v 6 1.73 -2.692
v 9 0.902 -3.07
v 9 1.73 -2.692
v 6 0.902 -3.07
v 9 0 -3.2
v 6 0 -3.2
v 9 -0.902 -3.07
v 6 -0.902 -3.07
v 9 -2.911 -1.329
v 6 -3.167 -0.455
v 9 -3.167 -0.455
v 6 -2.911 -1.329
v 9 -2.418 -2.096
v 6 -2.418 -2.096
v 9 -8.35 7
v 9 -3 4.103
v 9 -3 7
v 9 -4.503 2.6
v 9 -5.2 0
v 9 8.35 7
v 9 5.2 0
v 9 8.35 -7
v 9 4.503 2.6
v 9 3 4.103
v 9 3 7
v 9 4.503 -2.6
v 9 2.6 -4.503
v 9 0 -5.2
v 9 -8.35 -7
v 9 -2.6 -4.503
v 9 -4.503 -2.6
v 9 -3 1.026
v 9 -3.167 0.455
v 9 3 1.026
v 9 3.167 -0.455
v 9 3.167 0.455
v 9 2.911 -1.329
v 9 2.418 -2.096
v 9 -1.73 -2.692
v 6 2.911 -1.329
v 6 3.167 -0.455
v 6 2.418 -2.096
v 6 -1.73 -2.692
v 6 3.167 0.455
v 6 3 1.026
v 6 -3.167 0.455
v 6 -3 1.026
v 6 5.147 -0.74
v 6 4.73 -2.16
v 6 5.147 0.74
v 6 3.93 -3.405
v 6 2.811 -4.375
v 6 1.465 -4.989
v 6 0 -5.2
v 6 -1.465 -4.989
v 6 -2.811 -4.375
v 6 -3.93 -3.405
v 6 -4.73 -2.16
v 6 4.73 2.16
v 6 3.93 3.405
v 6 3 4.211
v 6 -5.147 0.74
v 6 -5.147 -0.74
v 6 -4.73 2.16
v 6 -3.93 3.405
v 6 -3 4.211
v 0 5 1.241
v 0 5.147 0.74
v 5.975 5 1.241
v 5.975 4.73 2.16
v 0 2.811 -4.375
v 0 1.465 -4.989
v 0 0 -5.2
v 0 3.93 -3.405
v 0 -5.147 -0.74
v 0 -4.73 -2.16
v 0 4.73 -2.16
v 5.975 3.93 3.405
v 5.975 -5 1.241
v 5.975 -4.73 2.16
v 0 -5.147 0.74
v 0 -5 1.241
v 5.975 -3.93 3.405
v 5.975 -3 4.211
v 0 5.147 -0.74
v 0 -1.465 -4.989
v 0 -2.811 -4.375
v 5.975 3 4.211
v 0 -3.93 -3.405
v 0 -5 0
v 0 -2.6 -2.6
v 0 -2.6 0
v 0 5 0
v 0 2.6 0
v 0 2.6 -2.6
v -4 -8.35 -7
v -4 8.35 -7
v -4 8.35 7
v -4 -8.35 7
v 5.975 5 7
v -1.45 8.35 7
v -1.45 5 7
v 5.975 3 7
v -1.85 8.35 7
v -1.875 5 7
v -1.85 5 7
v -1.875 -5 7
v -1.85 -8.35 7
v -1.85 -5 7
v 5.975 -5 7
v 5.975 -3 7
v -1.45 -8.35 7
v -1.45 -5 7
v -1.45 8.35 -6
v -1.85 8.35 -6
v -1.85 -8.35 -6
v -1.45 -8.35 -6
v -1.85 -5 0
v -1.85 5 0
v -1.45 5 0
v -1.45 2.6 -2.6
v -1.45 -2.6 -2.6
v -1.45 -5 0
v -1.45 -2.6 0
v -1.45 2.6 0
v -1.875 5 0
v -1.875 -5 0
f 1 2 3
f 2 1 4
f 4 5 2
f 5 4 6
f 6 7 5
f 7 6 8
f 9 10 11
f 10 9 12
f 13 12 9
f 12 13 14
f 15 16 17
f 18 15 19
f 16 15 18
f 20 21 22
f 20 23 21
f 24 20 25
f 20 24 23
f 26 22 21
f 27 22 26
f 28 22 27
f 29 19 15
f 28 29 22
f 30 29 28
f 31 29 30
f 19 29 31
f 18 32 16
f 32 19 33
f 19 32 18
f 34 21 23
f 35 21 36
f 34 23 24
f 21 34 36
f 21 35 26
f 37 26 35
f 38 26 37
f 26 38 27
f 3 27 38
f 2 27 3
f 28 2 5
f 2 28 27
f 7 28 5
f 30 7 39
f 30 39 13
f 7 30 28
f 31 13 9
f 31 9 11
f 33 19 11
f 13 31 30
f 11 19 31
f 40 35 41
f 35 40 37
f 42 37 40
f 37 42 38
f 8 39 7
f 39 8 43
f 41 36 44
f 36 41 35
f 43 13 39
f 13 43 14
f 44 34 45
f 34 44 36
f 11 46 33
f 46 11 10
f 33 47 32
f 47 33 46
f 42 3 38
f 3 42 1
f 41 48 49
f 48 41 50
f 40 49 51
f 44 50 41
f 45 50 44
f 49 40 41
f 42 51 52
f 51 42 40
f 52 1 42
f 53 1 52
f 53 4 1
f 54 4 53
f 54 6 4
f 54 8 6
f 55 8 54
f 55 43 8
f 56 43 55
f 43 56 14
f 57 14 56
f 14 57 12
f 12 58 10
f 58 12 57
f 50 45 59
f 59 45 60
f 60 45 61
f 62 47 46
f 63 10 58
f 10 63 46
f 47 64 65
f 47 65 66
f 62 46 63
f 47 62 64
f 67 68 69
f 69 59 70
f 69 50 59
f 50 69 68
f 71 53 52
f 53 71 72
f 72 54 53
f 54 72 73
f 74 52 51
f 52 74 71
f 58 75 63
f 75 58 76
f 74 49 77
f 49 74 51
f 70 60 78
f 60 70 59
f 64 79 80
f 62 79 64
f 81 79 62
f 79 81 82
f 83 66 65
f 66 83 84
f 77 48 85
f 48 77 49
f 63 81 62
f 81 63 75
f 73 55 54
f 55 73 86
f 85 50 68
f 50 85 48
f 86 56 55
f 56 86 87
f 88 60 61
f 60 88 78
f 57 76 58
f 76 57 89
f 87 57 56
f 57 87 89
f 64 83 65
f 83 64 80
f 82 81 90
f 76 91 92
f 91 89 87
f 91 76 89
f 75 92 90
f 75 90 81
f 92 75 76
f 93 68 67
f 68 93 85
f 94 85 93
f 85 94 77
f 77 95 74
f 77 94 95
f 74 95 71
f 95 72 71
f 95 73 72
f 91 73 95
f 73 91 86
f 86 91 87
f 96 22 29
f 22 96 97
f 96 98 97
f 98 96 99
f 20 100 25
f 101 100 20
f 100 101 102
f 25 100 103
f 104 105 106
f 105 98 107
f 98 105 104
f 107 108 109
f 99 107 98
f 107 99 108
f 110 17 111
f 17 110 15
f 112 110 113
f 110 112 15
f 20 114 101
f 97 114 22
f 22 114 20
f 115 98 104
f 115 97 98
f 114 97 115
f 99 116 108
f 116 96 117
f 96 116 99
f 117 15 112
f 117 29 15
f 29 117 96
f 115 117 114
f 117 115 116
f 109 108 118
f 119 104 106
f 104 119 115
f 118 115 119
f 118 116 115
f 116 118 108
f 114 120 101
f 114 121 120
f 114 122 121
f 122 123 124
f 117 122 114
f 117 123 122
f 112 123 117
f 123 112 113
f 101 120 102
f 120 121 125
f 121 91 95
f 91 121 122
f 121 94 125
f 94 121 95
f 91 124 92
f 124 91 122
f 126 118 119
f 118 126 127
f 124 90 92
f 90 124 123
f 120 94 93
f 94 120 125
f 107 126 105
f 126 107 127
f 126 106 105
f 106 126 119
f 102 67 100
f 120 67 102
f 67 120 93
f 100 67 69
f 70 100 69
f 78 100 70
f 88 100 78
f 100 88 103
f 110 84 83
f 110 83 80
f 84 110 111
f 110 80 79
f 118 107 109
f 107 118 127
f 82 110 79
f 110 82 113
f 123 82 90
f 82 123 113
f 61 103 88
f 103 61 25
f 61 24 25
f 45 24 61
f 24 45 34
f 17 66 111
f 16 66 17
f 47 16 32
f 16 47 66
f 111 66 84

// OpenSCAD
// Lights1a
// headblock for leds, fibers insert with ferrules Lights1b part

tol=0.20;

difference(){
// Rx body
translate([-4,-8.35,-7]) color("cyan")
linear_extrude(height=14) square(size=[13,16.7]);


rotate([0,90,0])
//difference(){
union(){
//------------
// First jacket
translate([0,0,16]) color("green")
cylinder(r1=4+tol,r2=2+tol,h=20,$fn=22);

//------------
// Narrow part
translate([0,0,6]) color("pink")
cylinder(r1=3+tol,r2=3+tol,h=3,$fn=22);

//------------
// wide part
translate([0,0,9]) color("red")
cylinder(r1=5+tol,r2=5+tol,h=3,$fn=12);
translate([0,0,12]) color("red")
cylinder(r1=4+tol,r2=4+tol,h=2,$fn=12);
translate([0,0,14]) color("red")
cylinder(r1=5+tol,r2=5+tol,h=3,$fn=12);

//-------------
//  head
translate([0,0,0]) color("orange")
cylinder(r1=5+tol,r2=5+tol,h=6,$fn=22);

}

//-------
// Fiber
//color("cyan")
//cylinder(r1=1.6,r2=1.7, h=50,$fn=22);
//}

//==========
// led tape and chip
translate([-1.85,-20,-6])
//linear_extrude(height=12) square(size=[0.2+tol,40]);
linear_extrude(height=16) square(size=[0.2+tol,40]);
translate([-1.65,-2.5-tol/2,-2.5-tol/2])
linear_extrude(height=5+tol) square(size=[1.65,5+tol]);

//-------
// extend cuts out the topside
translate([1.85+tol,0,0]) color("cyan")
linear_extrude(height=10) square(size=[1.85+6,10],center=true);

translate([7,0,0]) color("cyan")
linear_extrude(height=10) square(size=[6,6],center=true);

}
